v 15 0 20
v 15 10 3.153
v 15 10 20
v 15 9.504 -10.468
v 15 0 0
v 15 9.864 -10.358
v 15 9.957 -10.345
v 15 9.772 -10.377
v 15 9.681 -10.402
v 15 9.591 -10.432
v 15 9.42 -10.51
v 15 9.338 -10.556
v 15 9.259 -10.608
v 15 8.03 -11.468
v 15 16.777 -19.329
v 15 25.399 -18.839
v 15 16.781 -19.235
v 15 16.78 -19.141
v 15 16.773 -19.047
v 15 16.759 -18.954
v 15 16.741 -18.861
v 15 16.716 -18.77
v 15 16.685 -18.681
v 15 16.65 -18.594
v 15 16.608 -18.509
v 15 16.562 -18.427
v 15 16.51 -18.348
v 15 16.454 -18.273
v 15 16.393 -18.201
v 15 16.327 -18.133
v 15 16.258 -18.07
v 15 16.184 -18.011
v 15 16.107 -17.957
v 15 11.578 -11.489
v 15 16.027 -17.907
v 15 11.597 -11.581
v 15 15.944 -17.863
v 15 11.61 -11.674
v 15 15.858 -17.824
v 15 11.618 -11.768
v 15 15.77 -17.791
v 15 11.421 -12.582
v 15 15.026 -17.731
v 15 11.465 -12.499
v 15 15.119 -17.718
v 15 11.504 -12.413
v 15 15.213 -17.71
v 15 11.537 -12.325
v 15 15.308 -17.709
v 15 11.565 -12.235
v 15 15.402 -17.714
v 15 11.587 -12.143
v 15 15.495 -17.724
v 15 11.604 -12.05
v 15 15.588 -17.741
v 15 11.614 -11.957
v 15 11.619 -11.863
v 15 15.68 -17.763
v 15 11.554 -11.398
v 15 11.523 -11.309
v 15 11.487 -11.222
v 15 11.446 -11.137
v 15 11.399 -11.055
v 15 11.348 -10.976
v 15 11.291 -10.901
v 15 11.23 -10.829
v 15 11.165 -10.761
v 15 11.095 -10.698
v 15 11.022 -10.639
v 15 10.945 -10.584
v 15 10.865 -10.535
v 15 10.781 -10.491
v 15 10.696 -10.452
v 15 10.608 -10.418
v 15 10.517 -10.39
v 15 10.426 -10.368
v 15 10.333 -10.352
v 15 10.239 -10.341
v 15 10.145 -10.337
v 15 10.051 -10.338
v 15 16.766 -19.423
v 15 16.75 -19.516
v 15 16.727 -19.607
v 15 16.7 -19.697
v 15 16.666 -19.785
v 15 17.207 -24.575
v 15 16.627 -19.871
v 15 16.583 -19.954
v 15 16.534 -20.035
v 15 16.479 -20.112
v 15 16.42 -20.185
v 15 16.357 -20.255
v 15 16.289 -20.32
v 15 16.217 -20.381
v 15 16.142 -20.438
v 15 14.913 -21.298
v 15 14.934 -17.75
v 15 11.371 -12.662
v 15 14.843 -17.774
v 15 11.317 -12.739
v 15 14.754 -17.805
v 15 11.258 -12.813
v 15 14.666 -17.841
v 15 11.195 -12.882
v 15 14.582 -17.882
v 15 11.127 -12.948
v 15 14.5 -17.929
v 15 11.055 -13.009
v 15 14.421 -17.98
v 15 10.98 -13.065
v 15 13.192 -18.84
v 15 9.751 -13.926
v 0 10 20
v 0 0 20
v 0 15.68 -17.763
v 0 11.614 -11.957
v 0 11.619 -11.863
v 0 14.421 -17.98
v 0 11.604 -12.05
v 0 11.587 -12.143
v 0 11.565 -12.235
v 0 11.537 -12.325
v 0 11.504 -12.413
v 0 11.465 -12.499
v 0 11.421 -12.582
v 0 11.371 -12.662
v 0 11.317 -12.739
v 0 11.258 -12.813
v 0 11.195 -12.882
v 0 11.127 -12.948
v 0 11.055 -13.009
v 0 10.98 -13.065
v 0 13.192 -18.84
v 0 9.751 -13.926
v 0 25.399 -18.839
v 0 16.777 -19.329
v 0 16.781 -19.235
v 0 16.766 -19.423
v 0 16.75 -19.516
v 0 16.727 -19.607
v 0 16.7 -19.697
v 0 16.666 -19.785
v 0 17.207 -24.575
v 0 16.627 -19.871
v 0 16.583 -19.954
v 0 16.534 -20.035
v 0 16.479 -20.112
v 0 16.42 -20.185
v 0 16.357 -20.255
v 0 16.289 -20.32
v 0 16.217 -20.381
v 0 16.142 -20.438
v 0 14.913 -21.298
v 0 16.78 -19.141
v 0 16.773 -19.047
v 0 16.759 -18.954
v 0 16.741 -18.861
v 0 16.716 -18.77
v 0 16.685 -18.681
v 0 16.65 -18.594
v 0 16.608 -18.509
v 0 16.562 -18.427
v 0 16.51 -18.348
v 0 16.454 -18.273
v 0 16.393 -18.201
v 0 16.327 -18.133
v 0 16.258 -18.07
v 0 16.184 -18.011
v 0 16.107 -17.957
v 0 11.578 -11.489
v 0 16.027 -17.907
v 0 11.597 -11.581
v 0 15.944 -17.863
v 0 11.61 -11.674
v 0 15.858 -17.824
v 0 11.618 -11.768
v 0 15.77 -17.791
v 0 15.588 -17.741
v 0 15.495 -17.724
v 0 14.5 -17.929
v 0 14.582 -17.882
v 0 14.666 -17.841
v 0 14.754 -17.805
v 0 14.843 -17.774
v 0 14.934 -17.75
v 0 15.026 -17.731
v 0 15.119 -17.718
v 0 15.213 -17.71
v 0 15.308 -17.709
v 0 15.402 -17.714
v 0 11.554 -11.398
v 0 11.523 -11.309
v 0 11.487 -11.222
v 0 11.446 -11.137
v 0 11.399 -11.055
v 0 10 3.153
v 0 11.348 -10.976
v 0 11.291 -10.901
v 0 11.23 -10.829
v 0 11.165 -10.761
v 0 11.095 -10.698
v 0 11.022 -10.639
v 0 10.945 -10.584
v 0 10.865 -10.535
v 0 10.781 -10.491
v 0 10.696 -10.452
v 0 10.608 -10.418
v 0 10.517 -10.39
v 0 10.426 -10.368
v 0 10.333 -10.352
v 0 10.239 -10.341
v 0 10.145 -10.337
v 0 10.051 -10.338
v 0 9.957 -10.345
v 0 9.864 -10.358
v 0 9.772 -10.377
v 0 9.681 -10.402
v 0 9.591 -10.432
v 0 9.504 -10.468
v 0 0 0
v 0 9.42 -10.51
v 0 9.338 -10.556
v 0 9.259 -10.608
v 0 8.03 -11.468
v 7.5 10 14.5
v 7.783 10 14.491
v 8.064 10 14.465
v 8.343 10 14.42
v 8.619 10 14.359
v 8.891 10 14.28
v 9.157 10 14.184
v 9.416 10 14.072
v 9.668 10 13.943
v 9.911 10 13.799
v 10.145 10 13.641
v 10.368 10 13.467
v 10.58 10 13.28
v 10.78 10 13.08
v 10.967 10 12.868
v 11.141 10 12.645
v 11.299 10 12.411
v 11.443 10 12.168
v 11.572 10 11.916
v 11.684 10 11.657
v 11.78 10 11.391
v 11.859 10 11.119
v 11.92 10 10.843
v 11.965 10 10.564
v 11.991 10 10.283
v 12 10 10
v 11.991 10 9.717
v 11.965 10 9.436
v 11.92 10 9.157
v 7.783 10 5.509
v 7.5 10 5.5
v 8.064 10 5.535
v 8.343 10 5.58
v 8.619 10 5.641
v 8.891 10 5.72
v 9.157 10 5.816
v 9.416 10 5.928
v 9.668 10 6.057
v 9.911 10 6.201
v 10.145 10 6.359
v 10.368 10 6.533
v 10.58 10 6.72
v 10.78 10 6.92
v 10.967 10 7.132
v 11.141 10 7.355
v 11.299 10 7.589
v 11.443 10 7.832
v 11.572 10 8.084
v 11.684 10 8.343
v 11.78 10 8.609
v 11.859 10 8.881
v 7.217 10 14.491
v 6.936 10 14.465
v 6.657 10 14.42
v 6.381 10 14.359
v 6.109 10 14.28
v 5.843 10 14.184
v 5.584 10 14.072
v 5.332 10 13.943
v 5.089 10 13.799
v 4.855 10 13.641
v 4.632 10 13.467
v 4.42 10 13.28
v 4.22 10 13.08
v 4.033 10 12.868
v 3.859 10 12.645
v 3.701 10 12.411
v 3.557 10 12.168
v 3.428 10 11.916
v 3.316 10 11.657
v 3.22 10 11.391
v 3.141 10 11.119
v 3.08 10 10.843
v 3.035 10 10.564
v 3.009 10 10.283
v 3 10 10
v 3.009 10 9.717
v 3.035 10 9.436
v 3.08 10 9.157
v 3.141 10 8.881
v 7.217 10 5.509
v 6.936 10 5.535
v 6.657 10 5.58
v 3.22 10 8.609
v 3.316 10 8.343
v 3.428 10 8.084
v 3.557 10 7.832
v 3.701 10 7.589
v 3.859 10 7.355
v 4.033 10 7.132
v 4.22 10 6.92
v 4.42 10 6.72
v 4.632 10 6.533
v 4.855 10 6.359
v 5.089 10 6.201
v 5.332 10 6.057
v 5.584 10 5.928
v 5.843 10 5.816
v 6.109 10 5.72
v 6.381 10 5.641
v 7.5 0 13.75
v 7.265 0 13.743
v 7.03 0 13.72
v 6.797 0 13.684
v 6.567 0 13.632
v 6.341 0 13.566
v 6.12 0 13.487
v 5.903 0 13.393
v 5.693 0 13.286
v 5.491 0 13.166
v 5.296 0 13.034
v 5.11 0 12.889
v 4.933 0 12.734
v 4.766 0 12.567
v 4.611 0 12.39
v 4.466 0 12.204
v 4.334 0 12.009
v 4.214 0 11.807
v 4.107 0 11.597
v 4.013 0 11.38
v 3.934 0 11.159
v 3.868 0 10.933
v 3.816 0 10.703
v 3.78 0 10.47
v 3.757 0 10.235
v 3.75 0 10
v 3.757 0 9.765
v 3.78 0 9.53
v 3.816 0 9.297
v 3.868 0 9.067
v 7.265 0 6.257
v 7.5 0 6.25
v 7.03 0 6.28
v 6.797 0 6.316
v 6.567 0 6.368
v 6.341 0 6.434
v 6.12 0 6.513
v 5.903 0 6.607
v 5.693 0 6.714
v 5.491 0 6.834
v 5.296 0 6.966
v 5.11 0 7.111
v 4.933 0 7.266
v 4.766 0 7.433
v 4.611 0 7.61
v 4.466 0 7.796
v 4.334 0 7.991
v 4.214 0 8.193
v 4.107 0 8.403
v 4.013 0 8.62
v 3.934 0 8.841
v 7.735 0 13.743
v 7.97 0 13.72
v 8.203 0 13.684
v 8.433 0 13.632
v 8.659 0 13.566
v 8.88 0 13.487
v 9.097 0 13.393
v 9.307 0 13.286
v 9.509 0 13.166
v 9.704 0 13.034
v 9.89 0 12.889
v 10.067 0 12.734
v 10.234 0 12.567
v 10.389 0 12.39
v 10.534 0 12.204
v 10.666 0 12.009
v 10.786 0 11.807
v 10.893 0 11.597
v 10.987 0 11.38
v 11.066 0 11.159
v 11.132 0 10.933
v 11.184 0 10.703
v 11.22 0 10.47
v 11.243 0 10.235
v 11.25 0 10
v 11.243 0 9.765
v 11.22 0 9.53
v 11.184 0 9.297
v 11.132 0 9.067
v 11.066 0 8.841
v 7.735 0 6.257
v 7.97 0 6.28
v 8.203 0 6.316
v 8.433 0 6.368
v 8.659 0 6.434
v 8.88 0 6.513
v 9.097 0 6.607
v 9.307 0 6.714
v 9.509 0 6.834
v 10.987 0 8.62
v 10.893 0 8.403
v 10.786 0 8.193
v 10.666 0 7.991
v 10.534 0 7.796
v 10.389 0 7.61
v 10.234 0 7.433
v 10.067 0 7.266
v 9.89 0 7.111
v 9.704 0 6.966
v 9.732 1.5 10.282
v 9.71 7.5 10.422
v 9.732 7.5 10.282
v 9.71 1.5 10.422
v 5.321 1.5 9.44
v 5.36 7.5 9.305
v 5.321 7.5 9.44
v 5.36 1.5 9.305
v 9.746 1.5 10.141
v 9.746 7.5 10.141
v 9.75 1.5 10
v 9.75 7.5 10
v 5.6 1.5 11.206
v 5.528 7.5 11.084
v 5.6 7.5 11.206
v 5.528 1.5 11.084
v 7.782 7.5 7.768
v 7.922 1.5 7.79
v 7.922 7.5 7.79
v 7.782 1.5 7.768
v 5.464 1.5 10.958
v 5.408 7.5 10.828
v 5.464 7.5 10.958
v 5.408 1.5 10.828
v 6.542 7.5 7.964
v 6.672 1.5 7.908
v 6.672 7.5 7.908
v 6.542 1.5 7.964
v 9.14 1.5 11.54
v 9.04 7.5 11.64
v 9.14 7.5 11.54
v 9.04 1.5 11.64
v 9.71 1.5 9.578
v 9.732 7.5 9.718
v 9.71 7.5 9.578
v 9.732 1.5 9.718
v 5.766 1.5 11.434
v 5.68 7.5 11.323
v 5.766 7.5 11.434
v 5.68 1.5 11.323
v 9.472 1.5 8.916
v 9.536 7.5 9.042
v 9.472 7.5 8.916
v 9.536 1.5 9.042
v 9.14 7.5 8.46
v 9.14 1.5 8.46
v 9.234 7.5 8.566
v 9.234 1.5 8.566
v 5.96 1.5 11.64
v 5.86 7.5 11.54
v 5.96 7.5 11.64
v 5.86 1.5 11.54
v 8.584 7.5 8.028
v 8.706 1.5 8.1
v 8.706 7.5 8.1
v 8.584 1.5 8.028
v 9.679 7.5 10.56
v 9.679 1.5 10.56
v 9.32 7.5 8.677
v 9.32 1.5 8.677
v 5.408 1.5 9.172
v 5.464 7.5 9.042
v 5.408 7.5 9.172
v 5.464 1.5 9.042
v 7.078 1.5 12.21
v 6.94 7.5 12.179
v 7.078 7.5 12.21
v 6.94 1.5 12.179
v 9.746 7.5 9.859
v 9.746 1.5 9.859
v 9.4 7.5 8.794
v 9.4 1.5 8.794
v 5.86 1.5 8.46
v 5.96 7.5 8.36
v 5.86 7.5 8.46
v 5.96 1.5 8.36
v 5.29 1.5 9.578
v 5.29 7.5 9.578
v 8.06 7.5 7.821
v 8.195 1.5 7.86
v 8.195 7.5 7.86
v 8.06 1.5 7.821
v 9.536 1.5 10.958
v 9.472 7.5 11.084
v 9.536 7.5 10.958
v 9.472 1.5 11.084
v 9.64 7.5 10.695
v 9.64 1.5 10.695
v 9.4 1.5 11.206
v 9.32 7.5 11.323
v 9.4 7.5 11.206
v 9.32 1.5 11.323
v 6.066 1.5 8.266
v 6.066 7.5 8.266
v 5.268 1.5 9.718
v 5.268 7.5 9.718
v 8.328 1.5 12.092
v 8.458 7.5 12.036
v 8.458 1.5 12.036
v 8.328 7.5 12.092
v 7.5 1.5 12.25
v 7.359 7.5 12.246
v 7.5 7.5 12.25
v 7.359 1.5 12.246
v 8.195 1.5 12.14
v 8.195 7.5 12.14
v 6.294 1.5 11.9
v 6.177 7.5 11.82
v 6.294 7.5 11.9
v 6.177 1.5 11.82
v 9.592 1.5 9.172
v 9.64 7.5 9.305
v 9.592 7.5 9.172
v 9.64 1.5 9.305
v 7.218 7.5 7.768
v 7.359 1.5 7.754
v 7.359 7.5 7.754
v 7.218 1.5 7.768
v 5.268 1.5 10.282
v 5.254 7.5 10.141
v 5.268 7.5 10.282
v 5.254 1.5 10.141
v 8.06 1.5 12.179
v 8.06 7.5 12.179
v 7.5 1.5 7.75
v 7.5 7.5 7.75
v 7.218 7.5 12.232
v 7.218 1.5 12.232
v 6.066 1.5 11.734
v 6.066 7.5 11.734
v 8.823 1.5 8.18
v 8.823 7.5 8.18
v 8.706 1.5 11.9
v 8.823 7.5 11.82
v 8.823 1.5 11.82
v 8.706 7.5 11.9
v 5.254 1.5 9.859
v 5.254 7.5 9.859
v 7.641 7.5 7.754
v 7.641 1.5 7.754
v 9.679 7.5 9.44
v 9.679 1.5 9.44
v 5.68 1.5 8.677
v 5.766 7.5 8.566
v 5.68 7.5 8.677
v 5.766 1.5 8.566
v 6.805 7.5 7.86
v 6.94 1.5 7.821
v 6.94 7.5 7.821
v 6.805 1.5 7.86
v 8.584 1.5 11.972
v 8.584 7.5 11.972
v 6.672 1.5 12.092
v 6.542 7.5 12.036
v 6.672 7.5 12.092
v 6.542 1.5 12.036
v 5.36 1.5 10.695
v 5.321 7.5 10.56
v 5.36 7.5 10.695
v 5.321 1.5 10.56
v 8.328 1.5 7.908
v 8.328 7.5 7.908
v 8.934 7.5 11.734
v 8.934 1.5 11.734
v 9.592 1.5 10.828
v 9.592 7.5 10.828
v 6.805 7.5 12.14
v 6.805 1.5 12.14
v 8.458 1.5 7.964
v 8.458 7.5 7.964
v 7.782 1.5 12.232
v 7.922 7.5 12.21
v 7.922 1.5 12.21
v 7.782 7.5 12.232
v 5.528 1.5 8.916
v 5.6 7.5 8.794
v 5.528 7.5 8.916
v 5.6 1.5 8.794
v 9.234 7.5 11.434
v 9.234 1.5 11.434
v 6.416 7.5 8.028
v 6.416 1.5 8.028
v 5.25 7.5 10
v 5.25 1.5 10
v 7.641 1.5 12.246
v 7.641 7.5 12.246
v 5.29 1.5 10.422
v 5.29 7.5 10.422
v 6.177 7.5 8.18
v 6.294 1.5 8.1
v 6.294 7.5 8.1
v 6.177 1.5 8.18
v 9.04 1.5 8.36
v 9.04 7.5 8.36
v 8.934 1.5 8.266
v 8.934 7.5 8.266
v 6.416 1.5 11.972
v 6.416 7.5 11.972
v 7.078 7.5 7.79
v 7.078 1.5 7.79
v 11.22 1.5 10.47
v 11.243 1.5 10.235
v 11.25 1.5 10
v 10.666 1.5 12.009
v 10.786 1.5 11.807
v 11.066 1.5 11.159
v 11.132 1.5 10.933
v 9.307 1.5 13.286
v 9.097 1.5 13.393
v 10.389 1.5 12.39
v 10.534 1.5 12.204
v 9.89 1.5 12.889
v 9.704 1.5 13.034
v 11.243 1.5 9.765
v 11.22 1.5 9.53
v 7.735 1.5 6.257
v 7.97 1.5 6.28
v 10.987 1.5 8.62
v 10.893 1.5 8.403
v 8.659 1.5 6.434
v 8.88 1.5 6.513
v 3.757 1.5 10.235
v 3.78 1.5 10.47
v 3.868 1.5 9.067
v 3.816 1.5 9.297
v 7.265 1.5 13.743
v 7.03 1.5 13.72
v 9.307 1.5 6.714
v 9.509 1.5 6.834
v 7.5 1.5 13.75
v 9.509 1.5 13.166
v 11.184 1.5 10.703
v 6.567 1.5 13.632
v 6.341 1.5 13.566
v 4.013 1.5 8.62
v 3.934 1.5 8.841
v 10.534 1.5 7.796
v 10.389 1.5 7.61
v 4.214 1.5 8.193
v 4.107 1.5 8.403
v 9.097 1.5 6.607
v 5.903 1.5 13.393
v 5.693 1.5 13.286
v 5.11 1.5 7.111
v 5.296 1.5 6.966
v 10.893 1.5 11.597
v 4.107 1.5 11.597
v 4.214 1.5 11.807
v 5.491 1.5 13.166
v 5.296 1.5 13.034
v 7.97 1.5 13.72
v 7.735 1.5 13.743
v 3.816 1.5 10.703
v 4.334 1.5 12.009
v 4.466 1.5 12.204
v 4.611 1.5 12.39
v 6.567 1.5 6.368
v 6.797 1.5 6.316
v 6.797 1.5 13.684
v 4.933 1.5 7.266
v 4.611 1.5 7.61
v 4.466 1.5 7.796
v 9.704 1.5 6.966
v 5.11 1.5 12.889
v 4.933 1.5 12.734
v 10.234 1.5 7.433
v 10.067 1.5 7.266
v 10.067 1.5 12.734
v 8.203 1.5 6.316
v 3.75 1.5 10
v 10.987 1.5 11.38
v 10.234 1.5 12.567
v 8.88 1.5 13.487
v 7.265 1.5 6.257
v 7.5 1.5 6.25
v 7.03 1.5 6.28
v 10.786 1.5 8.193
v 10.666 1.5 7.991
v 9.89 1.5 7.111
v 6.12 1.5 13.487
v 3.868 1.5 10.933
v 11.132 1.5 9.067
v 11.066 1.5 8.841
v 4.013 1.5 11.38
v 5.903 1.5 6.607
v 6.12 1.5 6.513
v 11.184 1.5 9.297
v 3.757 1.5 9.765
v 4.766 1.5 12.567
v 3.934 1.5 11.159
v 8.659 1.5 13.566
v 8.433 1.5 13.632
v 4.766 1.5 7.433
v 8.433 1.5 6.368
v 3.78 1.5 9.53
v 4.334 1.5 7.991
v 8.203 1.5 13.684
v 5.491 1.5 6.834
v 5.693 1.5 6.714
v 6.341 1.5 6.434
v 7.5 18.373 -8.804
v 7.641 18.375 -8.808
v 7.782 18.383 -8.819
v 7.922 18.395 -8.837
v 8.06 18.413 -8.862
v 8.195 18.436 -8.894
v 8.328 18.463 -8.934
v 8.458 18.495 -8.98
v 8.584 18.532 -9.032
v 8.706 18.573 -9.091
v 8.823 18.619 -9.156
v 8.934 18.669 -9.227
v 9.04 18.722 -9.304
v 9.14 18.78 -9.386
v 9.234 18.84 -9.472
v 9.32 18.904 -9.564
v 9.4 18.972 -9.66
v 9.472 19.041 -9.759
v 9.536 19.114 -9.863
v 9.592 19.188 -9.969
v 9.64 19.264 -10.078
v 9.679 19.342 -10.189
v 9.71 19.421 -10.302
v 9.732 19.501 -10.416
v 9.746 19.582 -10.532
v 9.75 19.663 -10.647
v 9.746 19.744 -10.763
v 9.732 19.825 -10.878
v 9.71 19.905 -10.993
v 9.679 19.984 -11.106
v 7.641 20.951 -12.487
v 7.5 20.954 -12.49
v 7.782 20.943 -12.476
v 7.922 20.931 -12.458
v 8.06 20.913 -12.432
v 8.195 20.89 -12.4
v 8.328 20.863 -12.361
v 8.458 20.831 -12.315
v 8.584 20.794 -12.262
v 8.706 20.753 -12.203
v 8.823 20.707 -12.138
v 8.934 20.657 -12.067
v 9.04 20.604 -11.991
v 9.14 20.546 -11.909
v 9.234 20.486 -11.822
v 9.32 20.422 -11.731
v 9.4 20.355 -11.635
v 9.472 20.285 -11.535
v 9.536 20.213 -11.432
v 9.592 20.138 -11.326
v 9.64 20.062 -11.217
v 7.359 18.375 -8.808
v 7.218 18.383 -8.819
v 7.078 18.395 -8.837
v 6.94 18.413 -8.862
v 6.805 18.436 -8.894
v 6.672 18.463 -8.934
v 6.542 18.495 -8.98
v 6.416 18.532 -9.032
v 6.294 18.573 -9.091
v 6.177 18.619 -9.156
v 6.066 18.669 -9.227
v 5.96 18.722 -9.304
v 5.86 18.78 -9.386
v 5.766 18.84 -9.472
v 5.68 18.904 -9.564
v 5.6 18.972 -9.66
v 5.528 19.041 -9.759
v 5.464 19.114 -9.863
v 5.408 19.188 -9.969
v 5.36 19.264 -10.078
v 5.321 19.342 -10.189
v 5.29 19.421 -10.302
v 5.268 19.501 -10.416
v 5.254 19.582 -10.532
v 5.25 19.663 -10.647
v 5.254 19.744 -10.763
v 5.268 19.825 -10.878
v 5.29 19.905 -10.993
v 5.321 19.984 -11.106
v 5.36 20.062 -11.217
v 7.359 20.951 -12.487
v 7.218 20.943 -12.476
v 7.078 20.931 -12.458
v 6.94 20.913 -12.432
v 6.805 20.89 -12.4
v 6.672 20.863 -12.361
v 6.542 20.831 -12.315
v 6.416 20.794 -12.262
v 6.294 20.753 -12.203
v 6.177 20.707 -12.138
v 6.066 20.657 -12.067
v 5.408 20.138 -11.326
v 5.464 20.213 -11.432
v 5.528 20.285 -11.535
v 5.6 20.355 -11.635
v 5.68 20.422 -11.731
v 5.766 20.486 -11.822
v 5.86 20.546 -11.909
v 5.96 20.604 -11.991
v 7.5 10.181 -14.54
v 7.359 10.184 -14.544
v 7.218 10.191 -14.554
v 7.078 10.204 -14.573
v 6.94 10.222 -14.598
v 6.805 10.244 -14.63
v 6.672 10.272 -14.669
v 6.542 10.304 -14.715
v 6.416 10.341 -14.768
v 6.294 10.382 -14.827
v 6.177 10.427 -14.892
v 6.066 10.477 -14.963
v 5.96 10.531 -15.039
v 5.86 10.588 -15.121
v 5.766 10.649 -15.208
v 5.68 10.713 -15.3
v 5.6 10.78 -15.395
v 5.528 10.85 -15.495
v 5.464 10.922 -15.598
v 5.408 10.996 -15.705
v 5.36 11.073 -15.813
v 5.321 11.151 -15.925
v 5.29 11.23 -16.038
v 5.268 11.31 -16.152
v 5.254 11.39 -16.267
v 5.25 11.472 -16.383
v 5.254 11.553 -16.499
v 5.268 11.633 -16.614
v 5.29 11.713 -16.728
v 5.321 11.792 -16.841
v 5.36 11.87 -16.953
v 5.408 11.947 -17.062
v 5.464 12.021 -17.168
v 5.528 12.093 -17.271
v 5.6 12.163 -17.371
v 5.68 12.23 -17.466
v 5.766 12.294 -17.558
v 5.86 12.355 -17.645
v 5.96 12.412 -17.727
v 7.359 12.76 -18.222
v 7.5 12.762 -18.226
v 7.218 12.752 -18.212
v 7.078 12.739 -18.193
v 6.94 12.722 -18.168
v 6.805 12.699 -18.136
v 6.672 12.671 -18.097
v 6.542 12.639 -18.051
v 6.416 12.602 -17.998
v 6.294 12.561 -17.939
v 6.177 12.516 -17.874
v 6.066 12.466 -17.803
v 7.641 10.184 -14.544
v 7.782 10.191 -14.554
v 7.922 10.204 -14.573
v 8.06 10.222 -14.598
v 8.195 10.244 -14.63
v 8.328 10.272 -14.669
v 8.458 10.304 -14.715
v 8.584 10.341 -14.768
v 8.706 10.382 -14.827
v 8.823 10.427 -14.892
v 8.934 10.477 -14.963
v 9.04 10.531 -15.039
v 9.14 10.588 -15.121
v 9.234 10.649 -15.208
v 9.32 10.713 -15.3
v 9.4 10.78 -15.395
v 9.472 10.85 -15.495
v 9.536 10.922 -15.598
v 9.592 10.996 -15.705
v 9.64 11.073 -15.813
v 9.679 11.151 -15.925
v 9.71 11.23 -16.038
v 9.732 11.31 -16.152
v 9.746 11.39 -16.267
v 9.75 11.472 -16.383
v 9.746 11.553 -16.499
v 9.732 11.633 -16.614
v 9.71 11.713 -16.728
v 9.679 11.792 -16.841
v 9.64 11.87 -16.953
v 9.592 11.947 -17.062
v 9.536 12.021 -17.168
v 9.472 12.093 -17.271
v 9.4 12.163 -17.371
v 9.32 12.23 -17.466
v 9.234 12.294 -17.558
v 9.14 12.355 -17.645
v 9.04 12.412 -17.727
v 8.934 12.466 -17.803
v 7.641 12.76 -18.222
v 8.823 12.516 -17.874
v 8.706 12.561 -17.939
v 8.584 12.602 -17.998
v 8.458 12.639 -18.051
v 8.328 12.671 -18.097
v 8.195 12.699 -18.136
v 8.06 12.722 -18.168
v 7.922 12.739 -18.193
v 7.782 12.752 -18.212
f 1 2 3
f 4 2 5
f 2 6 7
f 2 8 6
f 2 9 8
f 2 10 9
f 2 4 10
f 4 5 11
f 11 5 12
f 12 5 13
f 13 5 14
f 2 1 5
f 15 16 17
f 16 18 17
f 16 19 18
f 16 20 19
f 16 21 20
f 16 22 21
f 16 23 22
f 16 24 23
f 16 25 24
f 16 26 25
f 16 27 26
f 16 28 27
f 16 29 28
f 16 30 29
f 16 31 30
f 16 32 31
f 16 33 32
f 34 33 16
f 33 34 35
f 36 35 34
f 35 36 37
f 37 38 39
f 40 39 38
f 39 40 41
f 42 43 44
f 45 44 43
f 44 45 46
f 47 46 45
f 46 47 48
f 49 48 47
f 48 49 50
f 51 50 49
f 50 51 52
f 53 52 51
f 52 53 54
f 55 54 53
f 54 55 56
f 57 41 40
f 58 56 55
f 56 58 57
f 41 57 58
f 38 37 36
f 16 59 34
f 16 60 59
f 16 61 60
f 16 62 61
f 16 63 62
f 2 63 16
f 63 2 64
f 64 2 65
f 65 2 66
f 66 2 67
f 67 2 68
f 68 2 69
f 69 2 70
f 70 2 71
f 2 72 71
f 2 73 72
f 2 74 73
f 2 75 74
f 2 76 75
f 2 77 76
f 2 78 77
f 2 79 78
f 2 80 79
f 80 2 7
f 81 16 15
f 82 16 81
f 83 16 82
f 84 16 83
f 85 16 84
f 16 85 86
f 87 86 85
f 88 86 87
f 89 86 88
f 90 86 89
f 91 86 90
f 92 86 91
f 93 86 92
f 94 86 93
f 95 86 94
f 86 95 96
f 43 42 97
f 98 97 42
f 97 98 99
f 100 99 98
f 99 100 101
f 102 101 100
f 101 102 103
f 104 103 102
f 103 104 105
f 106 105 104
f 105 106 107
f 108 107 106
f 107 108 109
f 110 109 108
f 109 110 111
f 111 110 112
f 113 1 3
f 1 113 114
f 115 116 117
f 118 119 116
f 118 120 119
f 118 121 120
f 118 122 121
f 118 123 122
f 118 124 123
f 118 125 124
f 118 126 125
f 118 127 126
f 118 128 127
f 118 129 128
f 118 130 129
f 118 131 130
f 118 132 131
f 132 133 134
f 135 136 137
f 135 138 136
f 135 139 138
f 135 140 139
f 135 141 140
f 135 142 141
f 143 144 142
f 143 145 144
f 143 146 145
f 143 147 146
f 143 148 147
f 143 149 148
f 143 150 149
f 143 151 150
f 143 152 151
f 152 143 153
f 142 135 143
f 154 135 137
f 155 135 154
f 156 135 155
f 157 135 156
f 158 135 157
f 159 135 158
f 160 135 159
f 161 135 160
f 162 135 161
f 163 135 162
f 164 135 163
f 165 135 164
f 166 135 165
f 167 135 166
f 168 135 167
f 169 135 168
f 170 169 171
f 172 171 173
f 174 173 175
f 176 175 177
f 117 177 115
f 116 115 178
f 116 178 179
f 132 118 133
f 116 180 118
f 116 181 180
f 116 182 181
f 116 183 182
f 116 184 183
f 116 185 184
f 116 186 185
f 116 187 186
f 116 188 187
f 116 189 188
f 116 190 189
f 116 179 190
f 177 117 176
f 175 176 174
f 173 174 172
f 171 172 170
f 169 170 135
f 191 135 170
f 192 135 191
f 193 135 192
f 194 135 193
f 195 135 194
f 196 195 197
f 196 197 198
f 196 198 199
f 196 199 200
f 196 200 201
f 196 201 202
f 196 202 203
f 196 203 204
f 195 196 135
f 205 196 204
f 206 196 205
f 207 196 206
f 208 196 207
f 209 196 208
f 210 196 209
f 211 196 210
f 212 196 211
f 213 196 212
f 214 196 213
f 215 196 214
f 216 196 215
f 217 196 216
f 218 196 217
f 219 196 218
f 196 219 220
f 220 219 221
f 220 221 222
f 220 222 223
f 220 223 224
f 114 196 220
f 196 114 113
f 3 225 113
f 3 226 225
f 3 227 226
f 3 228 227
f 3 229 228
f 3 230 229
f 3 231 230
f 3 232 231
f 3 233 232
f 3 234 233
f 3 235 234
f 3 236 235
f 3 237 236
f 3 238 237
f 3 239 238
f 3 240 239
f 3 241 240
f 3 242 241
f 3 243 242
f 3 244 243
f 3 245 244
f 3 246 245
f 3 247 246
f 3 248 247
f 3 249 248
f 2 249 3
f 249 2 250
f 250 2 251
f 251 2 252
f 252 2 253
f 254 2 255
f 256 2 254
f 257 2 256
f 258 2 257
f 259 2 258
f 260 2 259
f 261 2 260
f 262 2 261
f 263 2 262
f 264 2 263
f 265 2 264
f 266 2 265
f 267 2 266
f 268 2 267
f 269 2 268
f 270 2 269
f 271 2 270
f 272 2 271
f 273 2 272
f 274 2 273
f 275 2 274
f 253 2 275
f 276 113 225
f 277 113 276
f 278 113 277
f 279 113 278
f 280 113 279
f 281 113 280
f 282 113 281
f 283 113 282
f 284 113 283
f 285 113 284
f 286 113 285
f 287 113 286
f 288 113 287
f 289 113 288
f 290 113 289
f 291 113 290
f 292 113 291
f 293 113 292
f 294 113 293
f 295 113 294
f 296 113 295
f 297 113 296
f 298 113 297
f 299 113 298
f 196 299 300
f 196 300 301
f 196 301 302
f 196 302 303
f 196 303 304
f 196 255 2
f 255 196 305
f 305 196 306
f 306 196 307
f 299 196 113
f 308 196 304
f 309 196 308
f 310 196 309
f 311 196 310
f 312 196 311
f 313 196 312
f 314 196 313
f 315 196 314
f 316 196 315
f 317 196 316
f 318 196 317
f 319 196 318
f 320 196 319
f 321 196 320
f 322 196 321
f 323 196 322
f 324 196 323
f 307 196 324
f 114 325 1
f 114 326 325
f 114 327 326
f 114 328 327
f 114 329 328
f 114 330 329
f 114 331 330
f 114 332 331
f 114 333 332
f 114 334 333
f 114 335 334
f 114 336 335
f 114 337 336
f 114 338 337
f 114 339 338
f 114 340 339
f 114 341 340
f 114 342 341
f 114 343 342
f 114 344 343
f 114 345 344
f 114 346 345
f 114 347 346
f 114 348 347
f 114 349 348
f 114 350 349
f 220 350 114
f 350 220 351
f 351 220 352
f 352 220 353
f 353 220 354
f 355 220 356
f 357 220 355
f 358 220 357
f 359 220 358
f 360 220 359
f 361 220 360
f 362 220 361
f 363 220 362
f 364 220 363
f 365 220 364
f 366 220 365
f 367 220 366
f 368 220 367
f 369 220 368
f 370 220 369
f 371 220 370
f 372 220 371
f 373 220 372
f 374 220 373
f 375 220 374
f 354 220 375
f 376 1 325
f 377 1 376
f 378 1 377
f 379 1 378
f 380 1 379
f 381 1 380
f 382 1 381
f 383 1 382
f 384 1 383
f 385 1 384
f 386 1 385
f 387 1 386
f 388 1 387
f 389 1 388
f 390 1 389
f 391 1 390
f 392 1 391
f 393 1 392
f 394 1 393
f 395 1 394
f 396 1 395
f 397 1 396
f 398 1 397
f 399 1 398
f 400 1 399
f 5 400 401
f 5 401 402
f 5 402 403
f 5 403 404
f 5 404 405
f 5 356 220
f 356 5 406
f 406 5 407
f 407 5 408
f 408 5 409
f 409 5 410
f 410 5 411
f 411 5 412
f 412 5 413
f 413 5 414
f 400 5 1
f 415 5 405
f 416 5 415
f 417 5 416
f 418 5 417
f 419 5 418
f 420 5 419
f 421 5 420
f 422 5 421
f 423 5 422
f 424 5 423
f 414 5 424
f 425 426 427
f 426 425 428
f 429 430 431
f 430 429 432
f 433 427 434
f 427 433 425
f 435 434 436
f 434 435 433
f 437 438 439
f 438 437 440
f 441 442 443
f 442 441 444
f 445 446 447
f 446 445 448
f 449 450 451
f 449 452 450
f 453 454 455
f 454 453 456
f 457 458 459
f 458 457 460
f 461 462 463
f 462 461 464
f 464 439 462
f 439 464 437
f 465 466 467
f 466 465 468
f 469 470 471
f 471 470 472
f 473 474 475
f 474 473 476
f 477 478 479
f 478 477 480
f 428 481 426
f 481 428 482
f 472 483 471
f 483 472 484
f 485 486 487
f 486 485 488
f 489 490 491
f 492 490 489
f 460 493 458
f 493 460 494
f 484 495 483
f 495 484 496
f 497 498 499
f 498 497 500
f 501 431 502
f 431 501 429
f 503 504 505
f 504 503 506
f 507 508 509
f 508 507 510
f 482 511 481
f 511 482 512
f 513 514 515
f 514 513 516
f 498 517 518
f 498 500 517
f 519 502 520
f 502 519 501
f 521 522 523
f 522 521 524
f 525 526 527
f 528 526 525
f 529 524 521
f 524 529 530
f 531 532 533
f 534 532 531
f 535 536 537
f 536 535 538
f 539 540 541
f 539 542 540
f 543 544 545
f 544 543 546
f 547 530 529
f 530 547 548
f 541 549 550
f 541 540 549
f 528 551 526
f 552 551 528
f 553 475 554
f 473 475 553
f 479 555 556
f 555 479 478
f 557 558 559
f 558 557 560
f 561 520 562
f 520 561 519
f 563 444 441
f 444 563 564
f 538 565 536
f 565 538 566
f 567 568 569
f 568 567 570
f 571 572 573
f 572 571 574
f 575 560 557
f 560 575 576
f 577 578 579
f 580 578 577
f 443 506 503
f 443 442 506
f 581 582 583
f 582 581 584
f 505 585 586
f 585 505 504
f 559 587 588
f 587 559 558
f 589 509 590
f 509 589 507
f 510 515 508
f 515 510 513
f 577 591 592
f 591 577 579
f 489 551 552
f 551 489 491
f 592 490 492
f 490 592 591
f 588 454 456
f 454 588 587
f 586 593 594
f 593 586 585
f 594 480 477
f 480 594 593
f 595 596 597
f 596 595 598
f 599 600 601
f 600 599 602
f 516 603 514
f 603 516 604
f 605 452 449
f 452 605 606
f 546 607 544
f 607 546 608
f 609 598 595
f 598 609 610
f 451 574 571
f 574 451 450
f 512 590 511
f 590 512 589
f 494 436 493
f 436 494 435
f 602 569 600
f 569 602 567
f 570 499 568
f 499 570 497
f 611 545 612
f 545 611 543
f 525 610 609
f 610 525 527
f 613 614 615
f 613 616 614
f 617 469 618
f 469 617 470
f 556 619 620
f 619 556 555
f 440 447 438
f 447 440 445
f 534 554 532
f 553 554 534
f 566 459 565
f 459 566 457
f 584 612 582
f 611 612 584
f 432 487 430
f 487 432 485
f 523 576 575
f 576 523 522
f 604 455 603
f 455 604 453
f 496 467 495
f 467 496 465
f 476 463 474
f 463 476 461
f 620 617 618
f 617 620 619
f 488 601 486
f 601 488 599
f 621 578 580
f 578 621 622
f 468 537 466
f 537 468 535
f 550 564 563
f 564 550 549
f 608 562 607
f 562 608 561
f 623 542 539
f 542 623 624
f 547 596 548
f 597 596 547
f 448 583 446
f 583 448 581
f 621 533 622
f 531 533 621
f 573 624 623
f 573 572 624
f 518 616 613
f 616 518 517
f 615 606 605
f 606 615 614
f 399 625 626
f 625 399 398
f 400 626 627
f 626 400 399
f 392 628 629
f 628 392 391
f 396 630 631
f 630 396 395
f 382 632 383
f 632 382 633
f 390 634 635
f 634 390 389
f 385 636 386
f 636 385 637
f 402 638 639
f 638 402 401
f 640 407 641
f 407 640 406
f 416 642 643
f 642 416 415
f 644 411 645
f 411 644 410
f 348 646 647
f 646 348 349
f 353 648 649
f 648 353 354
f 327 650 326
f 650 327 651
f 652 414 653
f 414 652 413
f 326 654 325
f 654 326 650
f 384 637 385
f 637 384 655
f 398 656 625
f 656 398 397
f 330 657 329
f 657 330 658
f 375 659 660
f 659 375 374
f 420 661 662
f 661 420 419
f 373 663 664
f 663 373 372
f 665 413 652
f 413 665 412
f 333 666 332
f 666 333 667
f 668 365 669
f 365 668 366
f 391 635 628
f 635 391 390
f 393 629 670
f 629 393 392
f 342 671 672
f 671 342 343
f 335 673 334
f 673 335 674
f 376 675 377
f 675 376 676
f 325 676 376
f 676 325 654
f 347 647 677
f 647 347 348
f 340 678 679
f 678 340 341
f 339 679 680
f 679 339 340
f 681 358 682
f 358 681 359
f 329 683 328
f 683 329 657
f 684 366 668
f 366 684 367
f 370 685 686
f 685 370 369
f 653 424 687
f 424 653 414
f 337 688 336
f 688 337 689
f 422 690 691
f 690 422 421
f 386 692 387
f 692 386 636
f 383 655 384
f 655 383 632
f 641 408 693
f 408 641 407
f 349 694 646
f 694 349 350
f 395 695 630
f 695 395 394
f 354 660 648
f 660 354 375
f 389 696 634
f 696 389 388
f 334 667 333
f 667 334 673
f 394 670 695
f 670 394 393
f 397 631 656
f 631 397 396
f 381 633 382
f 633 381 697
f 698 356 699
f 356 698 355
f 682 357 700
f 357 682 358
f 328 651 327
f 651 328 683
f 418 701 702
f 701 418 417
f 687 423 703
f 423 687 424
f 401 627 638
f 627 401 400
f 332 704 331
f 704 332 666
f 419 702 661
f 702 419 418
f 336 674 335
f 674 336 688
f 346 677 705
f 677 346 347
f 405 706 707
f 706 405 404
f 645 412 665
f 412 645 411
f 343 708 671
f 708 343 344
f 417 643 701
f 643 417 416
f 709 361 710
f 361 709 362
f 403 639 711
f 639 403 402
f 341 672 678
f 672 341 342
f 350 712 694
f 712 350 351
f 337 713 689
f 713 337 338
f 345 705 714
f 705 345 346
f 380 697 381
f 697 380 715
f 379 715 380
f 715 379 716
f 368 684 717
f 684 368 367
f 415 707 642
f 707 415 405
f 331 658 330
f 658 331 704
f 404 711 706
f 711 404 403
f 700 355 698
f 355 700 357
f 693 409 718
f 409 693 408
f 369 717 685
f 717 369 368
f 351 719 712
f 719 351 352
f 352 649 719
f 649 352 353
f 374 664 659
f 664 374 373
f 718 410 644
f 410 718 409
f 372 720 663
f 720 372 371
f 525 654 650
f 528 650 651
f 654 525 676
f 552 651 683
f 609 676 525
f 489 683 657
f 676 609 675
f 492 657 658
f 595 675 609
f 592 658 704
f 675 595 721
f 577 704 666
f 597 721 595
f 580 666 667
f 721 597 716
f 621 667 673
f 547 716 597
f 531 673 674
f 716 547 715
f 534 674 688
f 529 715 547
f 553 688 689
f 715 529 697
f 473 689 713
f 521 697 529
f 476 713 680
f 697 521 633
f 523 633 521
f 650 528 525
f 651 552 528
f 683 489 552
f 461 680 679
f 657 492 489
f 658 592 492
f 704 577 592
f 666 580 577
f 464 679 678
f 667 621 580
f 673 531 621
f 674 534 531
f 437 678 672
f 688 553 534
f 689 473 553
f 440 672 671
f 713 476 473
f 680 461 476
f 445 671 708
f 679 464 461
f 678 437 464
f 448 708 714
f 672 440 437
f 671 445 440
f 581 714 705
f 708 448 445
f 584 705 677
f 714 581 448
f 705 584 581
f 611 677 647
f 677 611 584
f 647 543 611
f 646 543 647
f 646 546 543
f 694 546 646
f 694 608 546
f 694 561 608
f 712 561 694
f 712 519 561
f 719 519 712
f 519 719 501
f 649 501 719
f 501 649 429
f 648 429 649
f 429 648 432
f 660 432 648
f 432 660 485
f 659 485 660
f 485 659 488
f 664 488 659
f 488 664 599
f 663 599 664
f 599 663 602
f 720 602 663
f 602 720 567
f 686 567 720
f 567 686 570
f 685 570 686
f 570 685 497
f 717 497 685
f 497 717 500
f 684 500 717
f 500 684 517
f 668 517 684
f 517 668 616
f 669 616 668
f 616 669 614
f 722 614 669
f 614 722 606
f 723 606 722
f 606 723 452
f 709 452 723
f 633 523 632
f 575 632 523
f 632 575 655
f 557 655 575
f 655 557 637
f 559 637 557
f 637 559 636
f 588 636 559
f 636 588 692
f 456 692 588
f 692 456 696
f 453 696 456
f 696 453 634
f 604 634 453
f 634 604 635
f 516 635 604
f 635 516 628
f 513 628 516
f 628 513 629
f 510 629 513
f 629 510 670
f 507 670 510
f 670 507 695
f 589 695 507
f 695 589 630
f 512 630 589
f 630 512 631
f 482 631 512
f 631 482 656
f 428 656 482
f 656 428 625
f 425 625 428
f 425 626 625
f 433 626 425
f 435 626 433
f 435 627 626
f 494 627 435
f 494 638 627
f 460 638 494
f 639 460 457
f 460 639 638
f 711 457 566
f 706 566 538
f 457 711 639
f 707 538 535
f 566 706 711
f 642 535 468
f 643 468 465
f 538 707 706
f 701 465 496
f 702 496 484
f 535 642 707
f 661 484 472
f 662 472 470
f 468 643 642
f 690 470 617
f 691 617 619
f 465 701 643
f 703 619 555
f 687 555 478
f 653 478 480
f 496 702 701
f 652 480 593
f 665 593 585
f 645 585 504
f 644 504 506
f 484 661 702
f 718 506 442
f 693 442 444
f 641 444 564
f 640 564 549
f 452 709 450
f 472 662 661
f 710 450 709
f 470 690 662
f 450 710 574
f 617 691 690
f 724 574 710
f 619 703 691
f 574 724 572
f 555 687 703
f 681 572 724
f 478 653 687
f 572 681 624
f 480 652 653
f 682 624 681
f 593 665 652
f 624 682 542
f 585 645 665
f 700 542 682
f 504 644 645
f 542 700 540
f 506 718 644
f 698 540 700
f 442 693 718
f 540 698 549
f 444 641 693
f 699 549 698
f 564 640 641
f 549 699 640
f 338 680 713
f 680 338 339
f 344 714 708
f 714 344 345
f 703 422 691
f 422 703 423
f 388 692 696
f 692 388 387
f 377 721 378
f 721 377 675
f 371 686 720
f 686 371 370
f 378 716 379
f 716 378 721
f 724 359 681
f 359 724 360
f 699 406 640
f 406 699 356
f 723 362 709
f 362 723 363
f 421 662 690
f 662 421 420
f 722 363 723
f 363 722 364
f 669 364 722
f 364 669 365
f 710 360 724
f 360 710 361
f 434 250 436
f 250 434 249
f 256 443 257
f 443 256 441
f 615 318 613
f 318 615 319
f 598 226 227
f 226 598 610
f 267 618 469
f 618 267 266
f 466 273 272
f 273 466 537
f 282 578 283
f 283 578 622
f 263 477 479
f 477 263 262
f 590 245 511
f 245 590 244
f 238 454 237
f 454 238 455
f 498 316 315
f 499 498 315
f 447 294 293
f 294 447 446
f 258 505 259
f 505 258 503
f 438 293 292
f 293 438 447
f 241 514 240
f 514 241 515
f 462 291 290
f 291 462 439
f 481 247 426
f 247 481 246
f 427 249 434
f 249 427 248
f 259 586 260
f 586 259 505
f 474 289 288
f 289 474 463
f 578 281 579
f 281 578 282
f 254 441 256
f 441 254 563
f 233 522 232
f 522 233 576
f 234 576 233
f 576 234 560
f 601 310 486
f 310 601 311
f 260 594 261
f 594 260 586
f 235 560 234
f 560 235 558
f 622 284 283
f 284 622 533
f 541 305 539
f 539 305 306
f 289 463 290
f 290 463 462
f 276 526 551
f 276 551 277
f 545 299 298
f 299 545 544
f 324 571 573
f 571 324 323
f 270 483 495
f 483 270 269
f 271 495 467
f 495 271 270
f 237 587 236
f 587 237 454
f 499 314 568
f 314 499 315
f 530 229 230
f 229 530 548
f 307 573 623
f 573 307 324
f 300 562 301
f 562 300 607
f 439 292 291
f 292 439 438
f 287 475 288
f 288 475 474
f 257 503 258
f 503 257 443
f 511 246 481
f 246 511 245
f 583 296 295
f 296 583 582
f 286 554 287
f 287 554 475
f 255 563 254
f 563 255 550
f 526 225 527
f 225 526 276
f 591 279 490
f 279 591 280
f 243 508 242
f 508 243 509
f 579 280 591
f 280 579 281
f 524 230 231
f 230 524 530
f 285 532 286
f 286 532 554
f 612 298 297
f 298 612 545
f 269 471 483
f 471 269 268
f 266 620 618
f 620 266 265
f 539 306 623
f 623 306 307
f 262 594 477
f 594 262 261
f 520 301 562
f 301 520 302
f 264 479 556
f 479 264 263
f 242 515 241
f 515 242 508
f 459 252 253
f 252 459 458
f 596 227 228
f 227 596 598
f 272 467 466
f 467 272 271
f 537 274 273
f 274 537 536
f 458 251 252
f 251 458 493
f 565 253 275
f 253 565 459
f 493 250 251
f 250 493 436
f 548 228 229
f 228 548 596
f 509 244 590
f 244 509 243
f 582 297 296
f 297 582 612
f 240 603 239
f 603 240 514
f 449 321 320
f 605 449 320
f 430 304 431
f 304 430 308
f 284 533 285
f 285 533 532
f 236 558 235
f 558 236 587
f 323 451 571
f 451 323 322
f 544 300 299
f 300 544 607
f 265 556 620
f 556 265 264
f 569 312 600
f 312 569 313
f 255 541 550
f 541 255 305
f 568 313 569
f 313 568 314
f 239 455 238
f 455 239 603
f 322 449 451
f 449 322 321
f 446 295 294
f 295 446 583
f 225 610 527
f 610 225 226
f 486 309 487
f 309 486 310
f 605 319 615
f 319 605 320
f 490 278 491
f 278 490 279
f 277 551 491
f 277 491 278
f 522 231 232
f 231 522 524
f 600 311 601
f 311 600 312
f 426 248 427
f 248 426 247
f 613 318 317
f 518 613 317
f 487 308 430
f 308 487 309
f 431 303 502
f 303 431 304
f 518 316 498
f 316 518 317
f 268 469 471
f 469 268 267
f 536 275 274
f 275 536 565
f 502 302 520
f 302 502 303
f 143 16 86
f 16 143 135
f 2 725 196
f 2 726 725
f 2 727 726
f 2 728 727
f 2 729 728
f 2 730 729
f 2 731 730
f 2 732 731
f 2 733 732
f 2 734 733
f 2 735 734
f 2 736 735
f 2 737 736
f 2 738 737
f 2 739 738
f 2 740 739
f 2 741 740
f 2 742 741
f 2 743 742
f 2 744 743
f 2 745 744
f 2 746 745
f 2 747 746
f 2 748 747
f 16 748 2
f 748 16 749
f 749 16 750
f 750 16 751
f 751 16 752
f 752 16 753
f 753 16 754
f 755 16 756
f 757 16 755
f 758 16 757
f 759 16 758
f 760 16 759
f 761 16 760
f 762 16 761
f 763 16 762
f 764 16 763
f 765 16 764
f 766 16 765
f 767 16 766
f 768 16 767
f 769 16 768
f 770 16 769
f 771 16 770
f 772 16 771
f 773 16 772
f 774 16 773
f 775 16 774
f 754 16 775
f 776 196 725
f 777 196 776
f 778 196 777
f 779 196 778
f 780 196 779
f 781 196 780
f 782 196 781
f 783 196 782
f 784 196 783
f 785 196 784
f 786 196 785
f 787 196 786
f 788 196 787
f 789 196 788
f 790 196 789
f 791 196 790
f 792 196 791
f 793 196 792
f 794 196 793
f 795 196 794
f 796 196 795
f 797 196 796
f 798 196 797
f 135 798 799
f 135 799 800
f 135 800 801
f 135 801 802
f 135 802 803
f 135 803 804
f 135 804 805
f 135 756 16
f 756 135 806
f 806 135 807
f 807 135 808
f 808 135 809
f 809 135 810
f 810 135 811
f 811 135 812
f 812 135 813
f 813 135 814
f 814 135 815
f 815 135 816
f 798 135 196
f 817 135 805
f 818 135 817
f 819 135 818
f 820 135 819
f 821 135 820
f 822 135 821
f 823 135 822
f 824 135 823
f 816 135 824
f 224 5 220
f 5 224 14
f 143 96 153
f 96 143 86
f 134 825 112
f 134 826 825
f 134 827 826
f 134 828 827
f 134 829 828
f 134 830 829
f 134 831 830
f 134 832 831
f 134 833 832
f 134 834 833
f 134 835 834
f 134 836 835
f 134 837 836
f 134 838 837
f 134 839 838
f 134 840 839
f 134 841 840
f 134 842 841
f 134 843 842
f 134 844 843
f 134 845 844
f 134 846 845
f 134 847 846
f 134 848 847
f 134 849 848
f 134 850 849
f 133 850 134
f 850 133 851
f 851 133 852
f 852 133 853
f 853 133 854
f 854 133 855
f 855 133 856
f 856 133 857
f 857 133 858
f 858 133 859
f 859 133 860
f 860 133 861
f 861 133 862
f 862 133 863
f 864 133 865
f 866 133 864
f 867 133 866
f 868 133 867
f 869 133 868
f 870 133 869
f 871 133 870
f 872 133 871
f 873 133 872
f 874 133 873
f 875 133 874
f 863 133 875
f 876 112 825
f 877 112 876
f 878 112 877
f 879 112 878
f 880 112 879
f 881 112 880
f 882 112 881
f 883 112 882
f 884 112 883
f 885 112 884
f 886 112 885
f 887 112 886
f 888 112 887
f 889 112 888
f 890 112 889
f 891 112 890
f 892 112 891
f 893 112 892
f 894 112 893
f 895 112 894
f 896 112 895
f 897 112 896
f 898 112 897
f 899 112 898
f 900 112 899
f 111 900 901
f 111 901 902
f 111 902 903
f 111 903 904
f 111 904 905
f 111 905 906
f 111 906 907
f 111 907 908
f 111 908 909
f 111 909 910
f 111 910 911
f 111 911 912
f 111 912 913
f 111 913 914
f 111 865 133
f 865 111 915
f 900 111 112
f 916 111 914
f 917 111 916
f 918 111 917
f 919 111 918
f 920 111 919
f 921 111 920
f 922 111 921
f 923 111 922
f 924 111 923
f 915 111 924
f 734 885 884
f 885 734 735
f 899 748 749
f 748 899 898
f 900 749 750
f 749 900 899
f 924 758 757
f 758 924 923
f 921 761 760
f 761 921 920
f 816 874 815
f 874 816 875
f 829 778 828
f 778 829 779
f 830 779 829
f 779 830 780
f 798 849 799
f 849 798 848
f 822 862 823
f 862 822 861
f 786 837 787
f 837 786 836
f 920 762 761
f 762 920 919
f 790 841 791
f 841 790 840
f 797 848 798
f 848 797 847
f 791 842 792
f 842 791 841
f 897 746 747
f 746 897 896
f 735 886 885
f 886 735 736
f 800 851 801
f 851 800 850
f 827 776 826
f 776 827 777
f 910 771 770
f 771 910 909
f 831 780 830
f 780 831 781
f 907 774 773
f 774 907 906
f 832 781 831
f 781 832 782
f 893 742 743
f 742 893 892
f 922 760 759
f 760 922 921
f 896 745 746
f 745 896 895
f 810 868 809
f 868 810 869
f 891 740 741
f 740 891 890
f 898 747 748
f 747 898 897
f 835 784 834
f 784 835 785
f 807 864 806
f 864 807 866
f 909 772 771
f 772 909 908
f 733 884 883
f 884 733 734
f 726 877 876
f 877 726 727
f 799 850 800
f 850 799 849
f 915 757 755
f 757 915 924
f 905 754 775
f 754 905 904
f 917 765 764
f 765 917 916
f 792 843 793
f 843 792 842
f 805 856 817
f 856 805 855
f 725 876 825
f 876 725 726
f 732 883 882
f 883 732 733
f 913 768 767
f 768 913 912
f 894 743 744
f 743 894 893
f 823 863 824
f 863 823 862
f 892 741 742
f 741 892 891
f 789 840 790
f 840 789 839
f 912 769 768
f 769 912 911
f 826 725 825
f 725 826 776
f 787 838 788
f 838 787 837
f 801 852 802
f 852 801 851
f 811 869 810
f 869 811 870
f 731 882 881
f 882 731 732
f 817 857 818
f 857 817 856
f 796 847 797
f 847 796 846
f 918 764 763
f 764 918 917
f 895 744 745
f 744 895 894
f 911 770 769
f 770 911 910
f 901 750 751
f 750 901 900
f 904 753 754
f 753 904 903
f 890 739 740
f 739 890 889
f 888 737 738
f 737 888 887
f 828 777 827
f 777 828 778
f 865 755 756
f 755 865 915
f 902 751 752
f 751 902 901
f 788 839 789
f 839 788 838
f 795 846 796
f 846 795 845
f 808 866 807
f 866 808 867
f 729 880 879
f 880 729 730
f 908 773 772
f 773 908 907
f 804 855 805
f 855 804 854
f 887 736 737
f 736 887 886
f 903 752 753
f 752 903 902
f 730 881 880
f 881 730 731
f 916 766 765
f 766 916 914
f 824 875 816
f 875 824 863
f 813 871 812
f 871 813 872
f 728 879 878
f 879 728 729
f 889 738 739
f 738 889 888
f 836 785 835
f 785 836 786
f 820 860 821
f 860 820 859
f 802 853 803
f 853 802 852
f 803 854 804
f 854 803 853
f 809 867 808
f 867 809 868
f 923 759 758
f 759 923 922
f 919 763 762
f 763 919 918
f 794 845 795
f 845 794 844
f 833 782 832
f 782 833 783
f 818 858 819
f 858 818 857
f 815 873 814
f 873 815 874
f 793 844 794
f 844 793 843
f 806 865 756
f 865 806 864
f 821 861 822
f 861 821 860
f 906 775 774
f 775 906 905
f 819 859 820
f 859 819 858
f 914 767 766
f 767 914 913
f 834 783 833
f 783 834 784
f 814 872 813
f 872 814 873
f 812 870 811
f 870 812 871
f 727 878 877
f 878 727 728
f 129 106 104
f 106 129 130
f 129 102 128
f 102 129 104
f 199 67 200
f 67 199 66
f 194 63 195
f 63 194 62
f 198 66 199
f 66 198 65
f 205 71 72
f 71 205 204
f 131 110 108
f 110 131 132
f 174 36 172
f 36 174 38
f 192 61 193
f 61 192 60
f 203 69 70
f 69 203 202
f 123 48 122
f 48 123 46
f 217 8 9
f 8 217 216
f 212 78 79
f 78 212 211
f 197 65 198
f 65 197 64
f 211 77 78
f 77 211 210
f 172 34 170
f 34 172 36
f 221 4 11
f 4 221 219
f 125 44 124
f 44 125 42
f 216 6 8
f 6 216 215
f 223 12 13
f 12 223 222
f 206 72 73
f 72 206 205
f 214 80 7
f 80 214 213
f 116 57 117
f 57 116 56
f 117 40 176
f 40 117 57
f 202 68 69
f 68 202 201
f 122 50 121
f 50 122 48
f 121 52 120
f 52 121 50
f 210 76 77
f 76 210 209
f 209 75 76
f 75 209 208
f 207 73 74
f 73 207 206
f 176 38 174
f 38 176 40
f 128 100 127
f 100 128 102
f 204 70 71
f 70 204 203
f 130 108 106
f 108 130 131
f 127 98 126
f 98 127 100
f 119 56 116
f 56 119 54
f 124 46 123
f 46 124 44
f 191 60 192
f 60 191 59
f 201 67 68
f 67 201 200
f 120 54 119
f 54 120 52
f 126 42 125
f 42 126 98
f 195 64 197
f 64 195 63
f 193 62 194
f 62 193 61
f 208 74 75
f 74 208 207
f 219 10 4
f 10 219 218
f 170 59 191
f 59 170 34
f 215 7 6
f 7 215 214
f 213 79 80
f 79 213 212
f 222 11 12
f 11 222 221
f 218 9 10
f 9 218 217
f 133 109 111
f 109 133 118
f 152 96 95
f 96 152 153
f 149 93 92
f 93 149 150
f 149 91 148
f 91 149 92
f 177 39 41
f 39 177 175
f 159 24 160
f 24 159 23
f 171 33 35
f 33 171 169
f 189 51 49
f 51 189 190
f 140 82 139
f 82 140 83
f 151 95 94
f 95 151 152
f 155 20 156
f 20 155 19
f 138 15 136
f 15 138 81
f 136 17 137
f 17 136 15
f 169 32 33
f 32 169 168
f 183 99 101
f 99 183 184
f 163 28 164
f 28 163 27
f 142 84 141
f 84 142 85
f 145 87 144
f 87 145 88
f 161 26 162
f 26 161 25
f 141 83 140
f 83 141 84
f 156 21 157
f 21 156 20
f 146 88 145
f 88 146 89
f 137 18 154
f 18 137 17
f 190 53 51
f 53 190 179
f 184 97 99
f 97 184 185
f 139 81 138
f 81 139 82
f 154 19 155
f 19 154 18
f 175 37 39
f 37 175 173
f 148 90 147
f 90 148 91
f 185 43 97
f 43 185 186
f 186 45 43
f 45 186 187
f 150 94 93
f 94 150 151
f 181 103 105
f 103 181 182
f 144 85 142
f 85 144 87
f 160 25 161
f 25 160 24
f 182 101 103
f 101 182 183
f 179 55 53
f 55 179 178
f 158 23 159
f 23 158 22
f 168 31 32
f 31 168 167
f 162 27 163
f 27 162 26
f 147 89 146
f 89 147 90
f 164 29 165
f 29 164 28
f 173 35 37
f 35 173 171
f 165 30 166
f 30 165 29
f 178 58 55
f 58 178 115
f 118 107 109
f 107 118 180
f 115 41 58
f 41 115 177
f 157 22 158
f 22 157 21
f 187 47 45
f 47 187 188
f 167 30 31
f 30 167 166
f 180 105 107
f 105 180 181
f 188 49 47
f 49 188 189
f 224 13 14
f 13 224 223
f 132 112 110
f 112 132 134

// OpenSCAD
length = 30;
angle = 35;
holes = 4.5;
width = 15;
cabledia = 3;

union()
{
    difference()
    {
        cube([width, 10, length / 1.5], false);
        rotate([90,0,0]) translate([width / 2, length / 2 - 5,-10])  cylinder(10,  d = holes, $fn=100);
        rotate([90,0,0]) translate([width / 2, length / 2 - 5,- 1.5])  cylinder(1.5,  d = holes + 3, $fn=100);
        rotate([90,0,0]) translate([width / 2, length / 2 - 5,-10])  cylinder(5, d1 = holes * 2, d2 = 0,  $fn=100);
    };
    translate([0, sin(angle) * length, cos(angle) *  (-length)]) rotate([angle, 0, 0]) 
    difference()
    {
        cube([width, 10, length], false);
        rotate([90,0,0]) translate([width / 2, 10,-10])  cylinder(10, d = holes, $fn=100);
        rotate([0,90,0]) translate([-10 - holes, cabledia / 2, 0])  cylinder(width, d = cabledia, $fn=100);
        translate([0, -cabledia / 2, 10 - holes - cabledia / 2])  cube([width, cabledia, cabledia], $fn=10);
        rotate([0,90,0]) translate([-10 + holes, cabledia / 2, 0])  cylinder(width, d = cabledia, $fn=100);
        translate([0, -cabledia / 2, 10 + holes - cabledia / 2])  cube([width, cabledia, cabledia], $fn=10);
    }
}
